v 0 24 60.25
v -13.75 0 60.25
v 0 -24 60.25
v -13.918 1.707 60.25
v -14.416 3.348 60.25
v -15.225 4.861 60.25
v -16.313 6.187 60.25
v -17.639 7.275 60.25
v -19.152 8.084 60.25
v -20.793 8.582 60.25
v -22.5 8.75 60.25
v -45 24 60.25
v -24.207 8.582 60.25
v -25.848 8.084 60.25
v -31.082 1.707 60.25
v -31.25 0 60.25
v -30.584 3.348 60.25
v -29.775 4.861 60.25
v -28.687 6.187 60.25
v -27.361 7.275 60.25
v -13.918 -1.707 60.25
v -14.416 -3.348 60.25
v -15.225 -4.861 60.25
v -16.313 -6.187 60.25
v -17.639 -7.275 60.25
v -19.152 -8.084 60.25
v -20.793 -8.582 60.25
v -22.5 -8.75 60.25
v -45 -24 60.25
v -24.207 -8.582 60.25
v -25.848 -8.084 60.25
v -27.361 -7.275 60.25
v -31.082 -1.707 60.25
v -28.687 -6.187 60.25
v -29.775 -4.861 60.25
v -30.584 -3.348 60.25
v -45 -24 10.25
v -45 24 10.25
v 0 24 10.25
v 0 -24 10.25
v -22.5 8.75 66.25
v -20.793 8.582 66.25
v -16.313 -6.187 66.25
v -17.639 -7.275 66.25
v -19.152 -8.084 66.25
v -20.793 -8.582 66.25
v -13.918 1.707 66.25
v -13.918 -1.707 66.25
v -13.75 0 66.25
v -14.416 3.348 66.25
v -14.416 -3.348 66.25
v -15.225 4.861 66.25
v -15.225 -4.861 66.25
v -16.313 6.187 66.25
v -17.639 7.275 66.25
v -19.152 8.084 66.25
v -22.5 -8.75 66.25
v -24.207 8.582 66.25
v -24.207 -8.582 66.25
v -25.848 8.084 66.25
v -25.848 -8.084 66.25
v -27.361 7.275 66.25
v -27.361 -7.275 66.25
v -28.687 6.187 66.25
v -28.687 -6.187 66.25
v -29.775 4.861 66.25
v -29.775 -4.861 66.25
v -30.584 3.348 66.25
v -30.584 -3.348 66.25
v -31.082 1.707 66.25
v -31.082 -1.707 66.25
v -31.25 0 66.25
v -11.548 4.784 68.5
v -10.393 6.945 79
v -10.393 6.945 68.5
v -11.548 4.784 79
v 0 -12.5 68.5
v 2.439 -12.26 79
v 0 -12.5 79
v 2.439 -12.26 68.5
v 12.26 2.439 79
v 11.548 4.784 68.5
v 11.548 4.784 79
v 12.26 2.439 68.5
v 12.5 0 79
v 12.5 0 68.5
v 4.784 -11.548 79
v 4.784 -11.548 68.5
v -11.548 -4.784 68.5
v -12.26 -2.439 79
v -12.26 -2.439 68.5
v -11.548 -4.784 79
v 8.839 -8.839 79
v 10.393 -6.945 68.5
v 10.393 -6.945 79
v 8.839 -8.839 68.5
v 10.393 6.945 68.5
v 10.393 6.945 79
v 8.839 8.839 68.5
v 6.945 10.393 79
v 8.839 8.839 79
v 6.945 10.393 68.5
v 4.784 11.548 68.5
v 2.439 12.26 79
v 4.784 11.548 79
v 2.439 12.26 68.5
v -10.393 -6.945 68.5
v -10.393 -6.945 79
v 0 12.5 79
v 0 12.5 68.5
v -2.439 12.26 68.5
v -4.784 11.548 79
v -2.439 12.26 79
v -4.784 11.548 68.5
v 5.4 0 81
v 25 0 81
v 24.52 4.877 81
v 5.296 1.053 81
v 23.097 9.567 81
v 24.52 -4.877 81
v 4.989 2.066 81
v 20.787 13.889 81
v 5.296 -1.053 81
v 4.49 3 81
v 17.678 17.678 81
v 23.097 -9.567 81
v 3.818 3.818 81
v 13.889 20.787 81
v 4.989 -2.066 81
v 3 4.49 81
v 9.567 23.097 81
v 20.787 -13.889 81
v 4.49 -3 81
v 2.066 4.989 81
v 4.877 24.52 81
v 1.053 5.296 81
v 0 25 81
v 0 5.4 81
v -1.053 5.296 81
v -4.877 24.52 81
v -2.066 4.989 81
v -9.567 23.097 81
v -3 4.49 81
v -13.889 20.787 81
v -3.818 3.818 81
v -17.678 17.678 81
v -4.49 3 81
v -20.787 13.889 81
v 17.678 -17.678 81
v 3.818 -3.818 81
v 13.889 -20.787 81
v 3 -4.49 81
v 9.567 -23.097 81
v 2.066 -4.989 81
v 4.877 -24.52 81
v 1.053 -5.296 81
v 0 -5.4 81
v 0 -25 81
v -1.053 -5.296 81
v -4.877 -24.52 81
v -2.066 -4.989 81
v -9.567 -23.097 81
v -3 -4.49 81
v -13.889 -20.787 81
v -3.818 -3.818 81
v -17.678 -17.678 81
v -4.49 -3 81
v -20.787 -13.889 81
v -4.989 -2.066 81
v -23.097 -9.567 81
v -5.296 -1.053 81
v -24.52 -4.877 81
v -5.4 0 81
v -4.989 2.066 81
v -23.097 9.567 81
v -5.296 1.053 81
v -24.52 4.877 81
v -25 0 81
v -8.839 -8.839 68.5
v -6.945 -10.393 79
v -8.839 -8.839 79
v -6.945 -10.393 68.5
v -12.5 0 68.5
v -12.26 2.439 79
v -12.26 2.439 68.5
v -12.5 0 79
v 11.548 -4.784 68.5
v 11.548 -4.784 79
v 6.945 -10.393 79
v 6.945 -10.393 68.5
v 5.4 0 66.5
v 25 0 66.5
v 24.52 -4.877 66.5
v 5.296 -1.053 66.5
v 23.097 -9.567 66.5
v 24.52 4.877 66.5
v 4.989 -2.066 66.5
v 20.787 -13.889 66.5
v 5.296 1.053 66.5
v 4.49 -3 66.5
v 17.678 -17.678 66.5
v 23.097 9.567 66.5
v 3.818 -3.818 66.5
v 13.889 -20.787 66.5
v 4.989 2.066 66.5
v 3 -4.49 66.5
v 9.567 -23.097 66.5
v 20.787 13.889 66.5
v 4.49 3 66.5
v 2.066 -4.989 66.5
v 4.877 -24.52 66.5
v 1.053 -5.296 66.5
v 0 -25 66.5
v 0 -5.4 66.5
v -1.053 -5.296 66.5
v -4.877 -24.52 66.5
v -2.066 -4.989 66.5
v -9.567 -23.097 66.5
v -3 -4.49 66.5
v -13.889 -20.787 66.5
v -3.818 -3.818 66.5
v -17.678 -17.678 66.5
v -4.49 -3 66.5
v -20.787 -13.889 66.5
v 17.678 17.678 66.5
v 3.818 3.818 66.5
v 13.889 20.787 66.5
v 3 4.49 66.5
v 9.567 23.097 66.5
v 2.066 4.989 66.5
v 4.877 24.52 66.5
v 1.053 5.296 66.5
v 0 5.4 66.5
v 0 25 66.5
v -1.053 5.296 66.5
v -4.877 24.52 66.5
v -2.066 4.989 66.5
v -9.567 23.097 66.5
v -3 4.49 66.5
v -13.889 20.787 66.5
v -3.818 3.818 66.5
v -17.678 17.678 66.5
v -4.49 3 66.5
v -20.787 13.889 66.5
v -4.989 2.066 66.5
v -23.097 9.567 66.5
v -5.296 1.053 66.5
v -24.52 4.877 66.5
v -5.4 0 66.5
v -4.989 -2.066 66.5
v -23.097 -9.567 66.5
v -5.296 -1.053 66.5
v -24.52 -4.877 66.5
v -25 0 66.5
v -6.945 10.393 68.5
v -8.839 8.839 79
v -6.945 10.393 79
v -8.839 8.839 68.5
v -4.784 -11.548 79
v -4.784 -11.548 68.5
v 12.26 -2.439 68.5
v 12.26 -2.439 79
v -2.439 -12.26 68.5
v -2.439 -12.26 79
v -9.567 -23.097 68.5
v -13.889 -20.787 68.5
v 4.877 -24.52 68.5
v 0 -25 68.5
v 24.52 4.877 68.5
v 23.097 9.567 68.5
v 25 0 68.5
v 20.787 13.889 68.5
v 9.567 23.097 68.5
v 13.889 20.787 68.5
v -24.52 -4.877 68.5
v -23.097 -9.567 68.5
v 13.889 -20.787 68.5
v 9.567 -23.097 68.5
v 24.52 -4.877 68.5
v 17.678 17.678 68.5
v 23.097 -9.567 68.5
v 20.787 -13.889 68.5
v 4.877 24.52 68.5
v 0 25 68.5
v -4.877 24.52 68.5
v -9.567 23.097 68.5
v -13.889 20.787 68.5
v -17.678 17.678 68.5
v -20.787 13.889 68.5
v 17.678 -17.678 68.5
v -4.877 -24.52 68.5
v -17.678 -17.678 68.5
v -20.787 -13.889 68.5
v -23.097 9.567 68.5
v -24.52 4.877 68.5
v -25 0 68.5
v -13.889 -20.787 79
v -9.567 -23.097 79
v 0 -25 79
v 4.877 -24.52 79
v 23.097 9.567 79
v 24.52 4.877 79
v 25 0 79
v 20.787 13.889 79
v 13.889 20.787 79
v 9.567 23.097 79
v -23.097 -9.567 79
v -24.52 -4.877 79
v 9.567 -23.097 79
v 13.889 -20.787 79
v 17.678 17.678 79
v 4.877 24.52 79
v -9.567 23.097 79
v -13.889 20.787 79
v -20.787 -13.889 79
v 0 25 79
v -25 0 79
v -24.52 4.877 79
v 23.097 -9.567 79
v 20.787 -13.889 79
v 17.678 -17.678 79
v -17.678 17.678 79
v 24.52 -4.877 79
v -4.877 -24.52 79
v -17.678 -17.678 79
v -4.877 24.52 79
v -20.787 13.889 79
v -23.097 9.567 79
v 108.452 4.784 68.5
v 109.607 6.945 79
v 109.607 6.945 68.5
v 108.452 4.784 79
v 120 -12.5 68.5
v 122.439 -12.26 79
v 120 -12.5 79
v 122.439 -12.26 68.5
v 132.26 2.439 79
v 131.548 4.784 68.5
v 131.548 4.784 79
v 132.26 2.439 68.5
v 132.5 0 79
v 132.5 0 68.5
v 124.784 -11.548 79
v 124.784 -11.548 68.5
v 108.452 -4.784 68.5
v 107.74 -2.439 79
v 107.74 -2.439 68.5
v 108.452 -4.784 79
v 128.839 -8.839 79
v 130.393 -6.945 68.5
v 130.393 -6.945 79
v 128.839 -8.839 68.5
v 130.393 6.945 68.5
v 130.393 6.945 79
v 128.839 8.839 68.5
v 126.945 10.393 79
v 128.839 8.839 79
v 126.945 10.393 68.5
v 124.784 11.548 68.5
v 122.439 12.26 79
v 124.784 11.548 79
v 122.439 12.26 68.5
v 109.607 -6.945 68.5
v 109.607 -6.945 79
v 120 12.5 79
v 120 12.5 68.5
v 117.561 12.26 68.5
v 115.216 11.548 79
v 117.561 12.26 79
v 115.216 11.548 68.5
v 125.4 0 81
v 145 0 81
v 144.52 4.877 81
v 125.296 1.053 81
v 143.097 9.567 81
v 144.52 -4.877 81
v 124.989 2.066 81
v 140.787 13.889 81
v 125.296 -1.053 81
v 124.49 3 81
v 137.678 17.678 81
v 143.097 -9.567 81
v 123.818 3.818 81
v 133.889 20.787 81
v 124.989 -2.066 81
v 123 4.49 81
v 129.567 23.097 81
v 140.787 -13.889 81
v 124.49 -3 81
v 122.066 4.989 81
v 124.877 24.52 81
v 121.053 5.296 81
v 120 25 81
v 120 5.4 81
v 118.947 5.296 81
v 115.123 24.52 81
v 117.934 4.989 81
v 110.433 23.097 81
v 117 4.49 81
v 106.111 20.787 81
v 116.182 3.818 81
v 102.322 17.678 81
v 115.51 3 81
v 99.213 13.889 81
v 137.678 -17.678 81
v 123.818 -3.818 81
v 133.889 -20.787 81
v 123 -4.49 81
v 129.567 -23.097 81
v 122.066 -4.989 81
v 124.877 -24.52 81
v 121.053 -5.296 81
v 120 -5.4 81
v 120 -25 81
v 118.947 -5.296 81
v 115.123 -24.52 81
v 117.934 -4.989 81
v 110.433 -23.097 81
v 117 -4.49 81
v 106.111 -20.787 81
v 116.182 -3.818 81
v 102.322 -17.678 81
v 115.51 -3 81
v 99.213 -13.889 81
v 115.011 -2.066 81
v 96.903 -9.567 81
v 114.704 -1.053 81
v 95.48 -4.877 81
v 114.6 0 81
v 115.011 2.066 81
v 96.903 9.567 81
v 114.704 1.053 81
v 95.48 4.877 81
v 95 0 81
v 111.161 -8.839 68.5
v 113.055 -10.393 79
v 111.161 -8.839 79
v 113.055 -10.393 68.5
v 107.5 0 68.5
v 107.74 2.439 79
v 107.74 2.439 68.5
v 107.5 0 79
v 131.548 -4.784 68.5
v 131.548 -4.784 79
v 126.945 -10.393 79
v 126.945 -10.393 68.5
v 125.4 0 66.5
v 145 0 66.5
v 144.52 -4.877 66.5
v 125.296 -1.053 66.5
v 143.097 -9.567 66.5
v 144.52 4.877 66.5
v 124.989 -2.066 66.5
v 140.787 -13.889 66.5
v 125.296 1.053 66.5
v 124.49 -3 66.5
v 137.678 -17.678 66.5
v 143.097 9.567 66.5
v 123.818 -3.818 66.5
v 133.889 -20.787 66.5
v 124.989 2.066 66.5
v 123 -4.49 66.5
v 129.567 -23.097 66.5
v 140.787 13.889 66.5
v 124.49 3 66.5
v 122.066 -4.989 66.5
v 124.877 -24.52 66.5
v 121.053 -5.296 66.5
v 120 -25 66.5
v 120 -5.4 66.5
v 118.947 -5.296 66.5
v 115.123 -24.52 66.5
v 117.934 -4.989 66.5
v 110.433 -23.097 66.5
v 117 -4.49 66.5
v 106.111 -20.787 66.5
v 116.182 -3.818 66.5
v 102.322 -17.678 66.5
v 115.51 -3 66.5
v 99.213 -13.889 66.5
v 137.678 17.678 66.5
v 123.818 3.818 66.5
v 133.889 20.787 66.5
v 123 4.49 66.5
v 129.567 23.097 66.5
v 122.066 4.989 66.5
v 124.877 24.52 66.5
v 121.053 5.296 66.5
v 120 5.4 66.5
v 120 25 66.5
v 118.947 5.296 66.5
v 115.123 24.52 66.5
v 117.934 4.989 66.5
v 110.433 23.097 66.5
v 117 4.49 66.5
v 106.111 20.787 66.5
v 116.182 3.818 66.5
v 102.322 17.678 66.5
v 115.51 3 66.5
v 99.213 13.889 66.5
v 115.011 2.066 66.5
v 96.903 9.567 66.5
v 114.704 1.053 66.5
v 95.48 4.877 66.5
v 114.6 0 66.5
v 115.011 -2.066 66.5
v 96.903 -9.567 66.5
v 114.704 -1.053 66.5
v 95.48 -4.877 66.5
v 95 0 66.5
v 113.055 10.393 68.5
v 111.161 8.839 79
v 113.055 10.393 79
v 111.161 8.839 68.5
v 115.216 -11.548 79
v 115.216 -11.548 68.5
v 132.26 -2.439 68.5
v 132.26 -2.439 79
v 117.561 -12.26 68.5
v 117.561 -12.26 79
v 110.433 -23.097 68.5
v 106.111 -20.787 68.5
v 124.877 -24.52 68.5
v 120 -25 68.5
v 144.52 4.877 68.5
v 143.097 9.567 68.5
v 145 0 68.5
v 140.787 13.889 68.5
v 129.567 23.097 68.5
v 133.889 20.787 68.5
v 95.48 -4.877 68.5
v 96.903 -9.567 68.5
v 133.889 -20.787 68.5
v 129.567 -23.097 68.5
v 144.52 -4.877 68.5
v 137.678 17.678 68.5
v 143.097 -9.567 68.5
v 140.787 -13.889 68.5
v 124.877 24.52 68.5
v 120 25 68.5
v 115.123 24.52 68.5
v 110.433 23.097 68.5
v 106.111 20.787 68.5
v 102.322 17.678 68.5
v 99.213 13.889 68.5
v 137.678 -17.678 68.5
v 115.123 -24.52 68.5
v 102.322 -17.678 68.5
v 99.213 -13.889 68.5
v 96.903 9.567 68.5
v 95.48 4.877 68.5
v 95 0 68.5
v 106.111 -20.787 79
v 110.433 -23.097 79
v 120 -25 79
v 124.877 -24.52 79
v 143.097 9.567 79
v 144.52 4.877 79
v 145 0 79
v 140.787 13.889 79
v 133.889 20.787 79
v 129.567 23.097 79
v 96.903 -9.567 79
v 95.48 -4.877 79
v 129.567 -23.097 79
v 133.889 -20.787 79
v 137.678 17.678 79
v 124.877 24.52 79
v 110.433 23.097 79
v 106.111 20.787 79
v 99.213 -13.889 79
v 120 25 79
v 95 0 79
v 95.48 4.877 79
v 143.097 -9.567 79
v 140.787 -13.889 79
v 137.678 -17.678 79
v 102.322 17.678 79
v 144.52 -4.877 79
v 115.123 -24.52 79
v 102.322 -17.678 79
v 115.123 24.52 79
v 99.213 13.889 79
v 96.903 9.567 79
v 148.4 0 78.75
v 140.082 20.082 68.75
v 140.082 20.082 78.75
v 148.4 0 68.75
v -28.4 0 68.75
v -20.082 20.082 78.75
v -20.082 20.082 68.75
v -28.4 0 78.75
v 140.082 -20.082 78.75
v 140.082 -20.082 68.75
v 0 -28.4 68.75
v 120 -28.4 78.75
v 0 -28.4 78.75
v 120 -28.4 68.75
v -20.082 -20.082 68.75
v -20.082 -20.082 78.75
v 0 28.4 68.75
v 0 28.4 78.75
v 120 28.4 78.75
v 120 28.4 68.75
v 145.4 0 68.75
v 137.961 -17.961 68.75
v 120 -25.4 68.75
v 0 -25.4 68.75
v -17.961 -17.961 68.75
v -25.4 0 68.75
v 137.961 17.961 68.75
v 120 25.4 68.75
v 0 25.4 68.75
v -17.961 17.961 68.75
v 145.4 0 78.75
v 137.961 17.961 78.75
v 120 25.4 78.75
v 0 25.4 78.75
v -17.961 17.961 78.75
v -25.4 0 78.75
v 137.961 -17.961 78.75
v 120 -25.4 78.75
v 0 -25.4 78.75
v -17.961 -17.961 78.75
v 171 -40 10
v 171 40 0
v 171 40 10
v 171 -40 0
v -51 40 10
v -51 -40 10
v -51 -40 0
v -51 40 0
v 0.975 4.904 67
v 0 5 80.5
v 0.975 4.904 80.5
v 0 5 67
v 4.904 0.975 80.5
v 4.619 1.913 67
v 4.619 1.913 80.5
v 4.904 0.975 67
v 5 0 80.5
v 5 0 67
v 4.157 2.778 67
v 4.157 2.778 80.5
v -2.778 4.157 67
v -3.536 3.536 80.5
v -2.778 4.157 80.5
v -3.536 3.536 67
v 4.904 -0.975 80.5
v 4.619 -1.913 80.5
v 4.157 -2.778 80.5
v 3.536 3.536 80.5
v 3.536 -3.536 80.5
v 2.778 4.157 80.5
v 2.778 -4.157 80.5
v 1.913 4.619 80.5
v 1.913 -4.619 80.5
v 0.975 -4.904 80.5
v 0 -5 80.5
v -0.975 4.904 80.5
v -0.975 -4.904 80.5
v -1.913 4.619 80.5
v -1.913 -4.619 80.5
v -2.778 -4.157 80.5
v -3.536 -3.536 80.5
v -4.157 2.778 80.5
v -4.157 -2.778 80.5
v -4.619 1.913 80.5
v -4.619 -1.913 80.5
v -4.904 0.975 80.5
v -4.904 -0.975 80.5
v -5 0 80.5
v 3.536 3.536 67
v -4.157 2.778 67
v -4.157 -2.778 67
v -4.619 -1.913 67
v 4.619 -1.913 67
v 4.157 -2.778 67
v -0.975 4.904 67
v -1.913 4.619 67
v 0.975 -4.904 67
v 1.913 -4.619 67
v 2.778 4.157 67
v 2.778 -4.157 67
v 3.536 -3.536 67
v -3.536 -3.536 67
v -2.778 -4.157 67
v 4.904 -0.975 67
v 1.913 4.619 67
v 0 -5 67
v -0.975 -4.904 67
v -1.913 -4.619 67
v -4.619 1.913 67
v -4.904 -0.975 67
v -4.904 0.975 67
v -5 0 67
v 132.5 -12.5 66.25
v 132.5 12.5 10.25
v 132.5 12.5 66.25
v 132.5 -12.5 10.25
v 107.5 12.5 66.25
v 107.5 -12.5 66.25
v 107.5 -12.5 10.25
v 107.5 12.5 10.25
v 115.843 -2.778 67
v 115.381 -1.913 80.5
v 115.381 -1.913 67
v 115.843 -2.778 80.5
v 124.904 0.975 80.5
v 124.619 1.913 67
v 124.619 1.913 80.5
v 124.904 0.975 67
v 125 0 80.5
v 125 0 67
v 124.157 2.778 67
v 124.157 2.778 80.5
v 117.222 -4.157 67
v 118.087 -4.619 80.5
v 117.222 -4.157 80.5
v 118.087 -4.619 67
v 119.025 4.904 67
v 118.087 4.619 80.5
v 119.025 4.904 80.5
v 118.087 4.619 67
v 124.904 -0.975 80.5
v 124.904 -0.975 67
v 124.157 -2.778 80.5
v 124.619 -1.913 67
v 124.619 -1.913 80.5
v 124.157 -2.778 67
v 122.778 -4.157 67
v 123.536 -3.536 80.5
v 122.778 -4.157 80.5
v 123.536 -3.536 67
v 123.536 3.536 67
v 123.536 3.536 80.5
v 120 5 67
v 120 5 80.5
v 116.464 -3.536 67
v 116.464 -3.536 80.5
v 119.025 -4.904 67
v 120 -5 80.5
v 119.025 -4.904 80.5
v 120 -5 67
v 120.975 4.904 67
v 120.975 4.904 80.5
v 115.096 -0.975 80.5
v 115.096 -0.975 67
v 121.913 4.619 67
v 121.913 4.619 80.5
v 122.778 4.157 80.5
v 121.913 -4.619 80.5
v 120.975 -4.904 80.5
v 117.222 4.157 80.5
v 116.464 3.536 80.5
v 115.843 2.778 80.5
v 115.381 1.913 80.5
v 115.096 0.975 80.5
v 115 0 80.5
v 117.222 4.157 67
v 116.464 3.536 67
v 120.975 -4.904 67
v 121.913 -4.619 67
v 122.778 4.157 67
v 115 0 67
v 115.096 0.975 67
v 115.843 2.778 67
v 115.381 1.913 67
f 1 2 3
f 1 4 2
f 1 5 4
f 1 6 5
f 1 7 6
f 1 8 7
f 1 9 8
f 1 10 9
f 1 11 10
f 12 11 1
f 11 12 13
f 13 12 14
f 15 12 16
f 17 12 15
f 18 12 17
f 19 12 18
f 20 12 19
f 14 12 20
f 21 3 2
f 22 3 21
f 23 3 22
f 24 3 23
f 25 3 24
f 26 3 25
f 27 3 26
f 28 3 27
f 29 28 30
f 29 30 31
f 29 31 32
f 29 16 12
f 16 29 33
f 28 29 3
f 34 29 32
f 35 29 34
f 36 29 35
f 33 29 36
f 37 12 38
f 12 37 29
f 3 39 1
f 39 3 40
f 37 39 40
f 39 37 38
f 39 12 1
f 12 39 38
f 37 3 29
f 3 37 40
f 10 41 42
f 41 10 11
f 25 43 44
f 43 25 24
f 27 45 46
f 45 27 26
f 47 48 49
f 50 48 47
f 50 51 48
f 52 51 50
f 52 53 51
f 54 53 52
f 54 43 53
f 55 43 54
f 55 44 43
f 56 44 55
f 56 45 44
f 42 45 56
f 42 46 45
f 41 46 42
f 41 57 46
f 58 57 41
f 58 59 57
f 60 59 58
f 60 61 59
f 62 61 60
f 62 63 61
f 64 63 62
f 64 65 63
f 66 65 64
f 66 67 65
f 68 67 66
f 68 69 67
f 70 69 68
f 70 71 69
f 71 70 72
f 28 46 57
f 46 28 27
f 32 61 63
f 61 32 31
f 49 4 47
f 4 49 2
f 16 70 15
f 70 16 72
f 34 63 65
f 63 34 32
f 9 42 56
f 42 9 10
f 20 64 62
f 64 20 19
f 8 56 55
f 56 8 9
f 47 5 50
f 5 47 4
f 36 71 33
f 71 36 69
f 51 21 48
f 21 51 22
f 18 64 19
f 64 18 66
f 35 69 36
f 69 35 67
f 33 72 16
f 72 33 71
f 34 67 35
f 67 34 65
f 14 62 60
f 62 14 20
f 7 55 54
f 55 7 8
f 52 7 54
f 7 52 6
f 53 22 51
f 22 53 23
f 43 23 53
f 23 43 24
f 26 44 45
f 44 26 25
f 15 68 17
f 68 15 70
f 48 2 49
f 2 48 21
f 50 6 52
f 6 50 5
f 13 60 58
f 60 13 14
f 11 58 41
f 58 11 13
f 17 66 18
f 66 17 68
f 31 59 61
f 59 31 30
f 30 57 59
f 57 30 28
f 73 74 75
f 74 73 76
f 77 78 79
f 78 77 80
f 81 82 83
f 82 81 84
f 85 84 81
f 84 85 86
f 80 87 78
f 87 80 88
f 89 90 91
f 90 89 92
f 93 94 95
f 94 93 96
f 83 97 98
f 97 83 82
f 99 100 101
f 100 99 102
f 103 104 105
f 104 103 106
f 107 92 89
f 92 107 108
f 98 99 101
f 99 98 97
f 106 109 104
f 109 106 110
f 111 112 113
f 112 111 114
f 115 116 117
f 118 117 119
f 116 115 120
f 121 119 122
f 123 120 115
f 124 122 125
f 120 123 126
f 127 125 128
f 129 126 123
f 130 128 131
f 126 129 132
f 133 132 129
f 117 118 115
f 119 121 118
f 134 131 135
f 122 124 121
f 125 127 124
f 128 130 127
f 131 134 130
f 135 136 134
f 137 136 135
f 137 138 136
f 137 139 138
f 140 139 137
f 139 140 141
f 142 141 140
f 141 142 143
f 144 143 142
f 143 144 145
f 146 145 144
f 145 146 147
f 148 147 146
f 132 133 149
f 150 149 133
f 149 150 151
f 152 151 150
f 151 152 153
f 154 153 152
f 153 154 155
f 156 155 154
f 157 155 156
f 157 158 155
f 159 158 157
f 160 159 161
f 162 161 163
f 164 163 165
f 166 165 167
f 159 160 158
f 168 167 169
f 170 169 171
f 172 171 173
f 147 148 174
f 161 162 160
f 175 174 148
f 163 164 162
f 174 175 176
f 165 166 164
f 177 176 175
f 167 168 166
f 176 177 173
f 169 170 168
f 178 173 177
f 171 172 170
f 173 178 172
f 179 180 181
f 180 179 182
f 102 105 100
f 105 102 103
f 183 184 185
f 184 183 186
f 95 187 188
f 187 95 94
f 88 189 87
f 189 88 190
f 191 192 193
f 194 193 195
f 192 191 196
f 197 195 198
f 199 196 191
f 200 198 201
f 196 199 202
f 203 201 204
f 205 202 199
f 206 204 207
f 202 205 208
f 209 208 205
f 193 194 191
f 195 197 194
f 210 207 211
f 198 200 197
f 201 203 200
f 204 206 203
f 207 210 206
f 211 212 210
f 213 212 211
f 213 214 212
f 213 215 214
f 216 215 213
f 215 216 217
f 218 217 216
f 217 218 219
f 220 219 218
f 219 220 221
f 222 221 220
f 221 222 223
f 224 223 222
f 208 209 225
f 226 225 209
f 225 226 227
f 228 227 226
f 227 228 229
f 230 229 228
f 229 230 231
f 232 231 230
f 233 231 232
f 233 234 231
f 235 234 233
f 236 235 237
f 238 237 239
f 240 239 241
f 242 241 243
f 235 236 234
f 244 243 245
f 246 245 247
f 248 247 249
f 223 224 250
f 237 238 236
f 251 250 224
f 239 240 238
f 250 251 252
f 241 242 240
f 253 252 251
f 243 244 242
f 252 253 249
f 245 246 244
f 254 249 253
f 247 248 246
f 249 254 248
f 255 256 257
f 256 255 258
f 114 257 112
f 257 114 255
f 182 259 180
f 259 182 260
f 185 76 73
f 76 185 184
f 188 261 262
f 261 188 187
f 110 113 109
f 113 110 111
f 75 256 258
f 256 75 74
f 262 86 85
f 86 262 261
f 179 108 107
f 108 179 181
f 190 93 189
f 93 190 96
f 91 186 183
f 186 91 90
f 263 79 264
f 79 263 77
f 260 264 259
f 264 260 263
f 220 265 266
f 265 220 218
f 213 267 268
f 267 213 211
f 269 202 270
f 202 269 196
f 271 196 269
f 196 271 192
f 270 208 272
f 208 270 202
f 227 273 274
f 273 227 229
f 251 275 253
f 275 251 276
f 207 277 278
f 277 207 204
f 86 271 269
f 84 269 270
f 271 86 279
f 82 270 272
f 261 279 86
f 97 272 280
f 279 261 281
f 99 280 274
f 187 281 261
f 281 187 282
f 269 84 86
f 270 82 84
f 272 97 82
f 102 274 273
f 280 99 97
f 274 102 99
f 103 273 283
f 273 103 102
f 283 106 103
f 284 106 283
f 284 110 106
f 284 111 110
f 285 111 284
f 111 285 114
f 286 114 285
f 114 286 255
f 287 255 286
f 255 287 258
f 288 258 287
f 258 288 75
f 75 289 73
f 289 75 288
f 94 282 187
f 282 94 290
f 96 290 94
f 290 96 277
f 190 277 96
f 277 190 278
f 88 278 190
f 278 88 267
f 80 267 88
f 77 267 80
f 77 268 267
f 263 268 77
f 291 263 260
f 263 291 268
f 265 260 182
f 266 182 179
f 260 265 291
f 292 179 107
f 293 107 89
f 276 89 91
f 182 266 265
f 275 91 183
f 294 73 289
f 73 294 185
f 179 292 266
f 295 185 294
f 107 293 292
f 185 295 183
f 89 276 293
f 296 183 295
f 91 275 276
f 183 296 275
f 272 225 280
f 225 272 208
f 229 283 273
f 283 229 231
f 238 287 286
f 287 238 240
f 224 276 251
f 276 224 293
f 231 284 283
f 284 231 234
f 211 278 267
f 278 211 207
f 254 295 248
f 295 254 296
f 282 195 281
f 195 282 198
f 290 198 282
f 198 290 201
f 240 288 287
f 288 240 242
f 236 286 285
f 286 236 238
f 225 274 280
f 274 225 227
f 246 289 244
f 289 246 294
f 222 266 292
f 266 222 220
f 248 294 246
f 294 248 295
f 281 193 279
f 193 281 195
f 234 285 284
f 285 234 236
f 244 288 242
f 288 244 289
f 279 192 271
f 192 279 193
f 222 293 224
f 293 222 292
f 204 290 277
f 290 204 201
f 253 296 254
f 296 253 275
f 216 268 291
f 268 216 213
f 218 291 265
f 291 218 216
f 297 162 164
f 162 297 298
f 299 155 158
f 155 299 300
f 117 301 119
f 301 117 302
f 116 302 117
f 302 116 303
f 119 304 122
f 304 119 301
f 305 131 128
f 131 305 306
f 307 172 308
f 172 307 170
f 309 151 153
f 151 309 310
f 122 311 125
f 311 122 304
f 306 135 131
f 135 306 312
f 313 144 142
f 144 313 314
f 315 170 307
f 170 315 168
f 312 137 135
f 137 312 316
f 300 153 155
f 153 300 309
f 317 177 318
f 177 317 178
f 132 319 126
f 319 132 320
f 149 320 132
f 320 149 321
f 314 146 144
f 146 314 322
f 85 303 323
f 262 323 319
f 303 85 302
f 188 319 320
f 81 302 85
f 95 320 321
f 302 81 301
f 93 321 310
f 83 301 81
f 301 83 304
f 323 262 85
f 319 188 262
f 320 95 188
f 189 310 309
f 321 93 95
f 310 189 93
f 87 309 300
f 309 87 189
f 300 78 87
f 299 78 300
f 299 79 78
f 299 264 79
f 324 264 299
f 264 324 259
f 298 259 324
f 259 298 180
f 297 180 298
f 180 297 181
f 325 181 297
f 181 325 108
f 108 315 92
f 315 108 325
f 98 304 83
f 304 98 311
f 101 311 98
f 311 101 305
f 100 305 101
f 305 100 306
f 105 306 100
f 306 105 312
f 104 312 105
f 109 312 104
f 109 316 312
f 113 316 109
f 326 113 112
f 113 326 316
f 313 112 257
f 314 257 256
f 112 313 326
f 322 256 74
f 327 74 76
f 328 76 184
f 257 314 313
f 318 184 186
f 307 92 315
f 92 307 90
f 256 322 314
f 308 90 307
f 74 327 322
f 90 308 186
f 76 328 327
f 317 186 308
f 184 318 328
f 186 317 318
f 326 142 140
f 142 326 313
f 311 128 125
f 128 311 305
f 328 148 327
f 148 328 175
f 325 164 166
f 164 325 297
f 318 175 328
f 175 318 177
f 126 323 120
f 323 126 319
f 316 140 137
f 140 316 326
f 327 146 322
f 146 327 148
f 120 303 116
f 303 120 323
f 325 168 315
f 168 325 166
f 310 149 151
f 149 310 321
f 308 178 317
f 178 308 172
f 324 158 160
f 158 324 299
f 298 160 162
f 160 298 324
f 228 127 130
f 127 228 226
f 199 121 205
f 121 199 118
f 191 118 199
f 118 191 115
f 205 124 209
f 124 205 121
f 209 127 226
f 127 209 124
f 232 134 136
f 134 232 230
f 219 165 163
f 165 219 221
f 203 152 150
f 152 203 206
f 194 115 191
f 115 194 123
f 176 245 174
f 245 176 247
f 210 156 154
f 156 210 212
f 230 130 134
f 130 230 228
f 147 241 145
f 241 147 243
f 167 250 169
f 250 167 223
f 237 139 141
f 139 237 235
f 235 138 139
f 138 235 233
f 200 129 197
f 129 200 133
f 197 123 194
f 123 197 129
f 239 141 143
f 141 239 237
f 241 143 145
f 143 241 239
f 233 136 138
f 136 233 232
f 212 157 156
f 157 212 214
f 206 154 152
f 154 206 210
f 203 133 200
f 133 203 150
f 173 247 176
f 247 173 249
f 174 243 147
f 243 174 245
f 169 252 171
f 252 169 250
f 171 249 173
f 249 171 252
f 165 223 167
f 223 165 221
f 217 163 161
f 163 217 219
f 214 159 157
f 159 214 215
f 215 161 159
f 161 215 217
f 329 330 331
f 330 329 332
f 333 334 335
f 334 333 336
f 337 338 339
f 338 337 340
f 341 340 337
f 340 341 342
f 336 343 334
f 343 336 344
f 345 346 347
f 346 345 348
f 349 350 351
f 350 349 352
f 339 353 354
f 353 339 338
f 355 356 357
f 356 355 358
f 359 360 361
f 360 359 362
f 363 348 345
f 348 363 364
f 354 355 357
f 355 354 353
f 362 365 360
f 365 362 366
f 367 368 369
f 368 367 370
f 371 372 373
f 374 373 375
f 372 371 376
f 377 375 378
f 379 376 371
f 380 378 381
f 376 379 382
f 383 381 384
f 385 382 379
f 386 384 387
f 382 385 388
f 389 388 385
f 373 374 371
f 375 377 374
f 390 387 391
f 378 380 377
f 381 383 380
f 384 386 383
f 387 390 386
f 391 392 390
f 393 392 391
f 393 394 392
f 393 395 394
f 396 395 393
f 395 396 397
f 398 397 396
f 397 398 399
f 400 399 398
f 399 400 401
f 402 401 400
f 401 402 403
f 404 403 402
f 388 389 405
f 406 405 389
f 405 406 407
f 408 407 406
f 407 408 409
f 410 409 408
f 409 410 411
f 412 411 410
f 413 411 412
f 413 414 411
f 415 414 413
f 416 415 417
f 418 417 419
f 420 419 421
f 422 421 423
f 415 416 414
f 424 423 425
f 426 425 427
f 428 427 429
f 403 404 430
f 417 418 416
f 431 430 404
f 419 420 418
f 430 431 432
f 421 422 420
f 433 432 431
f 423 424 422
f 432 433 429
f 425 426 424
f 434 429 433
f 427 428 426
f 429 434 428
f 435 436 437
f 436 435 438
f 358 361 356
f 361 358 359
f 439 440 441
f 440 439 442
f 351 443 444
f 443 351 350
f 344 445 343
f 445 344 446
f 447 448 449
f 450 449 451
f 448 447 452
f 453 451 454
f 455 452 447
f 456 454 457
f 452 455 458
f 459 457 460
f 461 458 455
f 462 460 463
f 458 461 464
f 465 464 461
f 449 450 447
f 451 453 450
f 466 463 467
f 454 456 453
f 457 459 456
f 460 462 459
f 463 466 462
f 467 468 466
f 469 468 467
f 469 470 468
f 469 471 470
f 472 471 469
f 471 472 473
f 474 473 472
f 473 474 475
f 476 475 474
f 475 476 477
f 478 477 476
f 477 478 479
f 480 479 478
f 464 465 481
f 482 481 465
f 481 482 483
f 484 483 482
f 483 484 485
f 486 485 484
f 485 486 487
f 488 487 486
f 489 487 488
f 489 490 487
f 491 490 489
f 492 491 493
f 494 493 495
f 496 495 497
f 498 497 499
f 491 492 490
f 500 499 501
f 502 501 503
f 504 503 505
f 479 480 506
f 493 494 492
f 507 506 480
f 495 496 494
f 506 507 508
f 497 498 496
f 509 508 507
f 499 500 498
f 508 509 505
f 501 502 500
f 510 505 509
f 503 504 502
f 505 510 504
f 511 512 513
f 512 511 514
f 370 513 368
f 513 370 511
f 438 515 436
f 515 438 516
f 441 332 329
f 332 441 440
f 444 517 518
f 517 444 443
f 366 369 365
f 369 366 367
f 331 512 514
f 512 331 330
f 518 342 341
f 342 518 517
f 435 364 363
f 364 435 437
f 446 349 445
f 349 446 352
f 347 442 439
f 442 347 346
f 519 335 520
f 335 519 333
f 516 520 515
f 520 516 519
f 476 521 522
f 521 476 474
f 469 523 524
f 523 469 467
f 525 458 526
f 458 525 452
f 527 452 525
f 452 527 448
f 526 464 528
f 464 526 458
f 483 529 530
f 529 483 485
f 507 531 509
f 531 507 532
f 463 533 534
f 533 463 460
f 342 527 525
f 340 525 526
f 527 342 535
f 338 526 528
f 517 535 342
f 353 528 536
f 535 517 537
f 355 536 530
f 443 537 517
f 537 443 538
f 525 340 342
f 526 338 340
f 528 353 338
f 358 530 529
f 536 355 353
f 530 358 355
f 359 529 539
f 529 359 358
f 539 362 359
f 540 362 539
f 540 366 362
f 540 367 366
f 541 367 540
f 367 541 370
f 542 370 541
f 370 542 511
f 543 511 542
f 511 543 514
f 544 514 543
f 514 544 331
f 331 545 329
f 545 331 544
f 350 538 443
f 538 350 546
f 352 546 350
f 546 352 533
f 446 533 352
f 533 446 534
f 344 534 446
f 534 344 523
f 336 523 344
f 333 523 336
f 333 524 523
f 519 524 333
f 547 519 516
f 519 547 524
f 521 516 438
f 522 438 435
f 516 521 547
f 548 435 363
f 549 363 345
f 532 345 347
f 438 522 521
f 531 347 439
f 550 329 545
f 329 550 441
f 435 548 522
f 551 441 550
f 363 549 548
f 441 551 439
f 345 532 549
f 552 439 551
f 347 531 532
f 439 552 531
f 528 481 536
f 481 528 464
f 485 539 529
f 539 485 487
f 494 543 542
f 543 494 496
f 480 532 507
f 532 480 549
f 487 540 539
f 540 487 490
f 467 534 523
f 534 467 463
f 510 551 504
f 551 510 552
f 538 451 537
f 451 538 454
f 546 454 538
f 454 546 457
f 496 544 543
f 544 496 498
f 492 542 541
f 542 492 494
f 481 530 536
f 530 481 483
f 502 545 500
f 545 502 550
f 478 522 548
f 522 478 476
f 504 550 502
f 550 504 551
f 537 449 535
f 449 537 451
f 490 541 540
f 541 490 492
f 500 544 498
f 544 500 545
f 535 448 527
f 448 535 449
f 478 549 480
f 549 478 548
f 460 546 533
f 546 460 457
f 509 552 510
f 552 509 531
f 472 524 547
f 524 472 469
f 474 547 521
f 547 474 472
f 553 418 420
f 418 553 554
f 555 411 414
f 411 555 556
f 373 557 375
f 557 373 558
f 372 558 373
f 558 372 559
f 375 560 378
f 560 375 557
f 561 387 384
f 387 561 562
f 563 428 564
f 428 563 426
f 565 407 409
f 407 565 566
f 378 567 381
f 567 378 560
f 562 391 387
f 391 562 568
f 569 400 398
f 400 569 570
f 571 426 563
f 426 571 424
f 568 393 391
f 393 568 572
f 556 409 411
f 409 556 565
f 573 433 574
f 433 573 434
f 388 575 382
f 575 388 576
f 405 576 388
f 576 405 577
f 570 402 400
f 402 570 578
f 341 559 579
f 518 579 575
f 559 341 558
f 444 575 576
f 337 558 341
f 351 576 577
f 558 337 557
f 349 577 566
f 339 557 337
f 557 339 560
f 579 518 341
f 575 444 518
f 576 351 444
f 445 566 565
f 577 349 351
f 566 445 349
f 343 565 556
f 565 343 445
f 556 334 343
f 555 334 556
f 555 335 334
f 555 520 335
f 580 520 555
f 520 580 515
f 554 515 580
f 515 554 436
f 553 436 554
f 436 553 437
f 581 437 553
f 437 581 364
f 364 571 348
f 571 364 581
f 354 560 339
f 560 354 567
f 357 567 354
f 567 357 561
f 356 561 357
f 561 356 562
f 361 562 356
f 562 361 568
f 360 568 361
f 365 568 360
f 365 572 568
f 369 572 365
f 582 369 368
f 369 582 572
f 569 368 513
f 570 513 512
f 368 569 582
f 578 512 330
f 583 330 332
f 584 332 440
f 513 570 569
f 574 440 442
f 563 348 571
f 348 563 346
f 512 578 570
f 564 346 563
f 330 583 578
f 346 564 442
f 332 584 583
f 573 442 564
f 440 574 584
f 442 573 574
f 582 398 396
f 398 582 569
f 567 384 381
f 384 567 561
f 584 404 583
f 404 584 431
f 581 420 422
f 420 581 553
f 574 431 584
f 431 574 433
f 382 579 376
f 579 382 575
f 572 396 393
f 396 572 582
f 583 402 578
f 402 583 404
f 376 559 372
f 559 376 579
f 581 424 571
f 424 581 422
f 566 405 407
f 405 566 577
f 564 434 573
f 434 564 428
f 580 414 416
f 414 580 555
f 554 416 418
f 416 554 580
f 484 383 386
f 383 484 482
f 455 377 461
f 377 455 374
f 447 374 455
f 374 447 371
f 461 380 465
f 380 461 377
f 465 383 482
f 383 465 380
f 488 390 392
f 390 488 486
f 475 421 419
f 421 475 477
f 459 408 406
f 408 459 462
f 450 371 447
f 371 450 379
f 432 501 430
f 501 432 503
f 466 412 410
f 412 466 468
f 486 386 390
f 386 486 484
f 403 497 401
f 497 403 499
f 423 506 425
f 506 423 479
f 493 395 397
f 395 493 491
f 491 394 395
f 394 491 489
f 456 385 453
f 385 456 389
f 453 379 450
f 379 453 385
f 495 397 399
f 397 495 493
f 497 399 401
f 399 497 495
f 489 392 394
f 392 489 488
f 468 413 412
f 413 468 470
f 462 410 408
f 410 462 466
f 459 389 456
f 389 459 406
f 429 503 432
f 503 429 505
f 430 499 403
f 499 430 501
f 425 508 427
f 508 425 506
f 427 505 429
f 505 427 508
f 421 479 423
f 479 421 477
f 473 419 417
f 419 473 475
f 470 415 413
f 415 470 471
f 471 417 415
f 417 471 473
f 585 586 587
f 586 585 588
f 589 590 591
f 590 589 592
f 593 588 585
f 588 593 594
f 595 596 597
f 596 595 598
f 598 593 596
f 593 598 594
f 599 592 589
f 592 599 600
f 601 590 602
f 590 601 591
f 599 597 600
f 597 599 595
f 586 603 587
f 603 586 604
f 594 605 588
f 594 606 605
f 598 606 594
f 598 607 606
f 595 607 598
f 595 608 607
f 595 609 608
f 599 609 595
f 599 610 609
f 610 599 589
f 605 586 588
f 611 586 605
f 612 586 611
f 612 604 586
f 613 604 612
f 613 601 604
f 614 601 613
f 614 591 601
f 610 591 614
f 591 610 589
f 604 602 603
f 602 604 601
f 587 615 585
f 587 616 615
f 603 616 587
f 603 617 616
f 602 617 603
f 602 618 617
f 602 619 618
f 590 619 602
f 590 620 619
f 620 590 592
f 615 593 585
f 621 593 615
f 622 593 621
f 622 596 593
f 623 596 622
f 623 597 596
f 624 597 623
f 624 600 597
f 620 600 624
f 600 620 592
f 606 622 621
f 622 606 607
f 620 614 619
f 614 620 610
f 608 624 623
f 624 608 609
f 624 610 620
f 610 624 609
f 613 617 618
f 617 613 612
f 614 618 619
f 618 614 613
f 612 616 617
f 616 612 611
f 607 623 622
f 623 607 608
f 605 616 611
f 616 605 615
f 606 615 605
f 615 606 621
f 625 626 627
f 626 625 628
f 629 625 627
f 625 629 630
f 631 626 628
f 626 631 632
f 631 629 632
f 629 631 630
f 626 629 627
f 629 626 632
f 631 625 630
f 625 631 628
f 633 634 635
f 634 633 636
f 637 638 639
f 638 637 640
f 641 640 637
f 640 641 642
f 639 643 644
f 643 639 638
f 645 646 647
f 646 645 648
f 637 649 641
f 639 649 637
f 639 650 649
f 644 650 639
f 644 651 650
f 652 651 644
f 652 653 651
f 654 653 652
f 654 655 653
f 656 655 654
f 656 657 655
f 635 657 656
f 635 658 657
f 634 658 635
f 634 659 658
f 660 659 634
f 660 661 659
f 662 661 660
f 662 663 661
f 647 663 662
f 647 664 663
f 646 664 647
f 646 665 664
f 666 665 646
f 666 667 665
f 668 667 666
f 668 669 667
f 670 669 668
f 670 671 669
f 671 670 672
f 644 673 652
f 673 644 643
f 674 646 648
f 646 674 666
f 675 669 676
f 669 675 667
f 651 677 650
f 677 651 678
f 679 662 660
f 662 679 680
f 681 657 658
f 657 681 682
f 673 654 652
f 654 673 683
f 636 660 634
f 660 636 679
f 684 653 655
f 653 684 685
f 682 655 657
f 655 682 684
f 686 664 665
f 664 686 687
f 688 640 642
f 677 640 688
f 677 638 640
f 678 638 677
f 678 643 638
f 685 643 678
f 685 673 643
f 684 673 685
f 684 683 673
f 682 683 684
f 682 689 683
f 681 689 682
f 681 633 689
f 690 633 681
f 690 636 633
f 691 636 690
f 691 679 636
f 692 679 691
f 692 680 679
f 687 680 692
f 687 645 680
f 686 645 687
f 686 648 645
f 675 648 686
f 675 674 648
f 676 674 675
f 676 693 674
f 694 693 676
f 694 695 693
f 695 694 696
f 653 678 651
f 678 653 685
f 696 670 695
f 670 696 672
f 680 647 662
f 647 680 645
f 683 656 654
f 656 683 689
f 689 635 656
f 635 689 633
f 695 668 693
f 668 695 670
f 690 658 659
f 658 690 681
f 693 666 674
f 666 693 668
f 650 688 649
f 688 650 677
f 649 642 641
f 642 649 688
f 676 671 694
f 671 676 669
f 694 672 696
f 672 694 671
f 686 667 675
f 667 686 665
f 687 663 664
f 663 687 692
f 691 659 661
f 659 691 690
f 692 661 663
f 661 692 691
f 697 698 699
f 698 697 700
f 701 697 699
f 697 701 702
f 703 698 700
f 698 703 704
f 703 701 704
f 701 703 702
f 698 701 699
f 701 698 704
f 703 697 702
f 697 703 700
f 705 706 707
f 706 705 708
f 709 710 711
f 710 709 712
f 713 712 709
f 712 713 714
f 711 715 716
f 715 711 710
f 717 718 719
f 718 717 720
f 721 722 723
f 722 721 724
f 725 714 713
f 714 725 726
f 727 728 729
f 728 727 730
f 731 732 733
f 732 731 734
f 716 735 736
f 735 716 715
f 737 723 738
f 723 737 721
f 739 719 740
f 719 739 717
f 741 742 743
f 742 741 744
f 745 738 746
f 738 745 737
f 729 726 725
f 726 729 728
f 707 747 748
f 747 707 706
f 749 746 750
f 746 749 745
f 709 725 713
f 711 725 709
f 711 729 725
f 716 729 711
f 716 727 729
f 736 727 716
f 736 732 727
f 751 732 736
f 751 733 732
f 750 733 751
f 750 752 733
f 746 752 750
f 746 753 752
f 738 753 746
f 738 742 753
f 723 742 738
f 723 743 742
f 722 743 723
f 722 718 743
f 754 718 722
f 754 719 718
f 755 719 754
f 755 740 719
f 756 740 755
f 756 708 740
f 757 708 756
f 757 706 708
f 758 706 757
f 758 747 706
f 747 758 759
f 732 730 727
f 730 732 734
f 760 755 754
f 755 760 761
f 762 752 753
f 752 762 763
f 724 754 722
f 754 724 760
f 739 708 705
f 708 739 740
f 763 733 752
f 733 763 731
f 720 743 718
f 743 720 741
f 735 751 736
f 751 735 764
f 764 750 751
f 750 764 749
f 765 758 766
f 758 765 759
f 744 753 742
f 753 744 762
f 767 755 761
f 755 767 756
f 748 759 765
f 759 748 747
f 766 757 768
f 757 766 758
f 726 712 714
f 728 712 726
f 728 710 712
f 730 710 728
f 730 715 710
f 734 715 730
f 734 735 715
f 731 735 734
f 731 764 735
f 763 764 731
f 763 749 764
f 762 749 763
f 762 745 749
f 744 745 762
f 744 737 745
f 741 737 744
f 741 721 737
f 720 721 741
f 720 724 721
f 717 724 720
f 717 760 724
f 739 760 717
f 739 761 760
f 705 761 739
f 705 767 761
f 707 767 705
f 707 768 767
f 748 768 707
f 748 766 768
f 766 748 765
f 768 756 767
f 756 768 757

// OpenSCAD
$fn = 32;

// ------------------------------------------------------------------------
// Motor belt drive: span 120 mm, pulleys d50, belt 10 mm wide
// Every part is its own module, assembly() places every instance.
// ------------------------------------------------------------------------

// --- part 1 ---
module base_plate() {
  difference() {
    translate([-111, -40, 0]) cube([222, 80, 10]);
  }
}

// --- part 2 ---
module motor() {
  union() {
    translate([-25, -24, 0]) cube([50, 48, 45]);
    translate([28, 0, 22.5]) rotate([0, 90, 0]) cylinder(h = 6, d = 17.5, center = true);
  }
}

// --- part 3 ---
module drive_shaft() {
  translate([0, 0, -6.75]) cylinder(h = 13.5, d = 10);
}

// --- part 4 ---
module pulley_drive() {
  difference() {
    union() {
      cylinder(h = 14.5, d = 25);
      cylinder(h = 2, d = 50);
      translate([0, 0, 12.5]) cylinder(h = 2, d = 50);
    }
    translate([0, 0, -1]) cylinder(h = 16.5, d = 10.8);
  }
}

// --- part 5 ---
module idler_post() {
  translate([-12.5, -12.5, 0]) cube([25, 25, 56]);
}

// --- part 6 ---
module driven_shaft() {
  translate([0, 0, -6.75]) cylinder(h = 13.5, d = 10);
}

// --- part 7 ---
module pulley_driven() {
  difference() {
    union() {
      cylinder(h = 14.5, d = 25);
      cylinder(h = 2, d = 50);
      translate([0, 0, 12.5]) cylinder(h = 2, d = 50);
    }
    translate([0, 0, -1]) cylinder(h = 16.5, d = 10.8);
  }
}

// --- part 8 ---
module drive_belt() {
  difference() {
    linear_extrude(height = 10) polygon(points = concat([for (a = [90 : 45 : 270]) [28.4 * cos(a), 28.4 * sin(a)]], [for (a = [270 : 45 : 450]) [120 + 28.4 * cos(a), 28.4 * sin(a)]]));
    translate([0, 0, -1]) linear_extrude(height = 12) polygon(points = concat([for (a = [90 : 45 : 270]) [25.4 * cos(a), 25.4 * sin(a)]], [for (a = [270 : 45 : 450]) [120 + 25.4 * cos(a), 25.4 * sin(a)]]));
  }
}

// --- assembly ---
module assembly() {
  color([0.80, 0.24, 0.20]) translate([60, 0, 0]) rotate([0, 0, 0]) base_plate();
  color([0.20, 0.45, 0.75]) translate([0, 0, 35.25]) rotate([0, 270, 0]) motor();
  color([0.25, 0.62, 0.32]) translate([0, 0, 73.75]) rotate([0, 0, 0]) drive_shaft();
  color([0.92, 0.70, 0.18]) translate([0, 0, 66.5]) rotate([0, 0, 0]) pulley_drive();
  color([0.58, 0.35, 0.70]) translate([120, 0, 10.25]) rotate([0, 0, 0]) idler_post();
  color([0.16, 0.66, 0.66]) translate([120, 0, 73.75]) rotate([0, 0, 0]) driven_shaft();
  color([0.85, 0.48, 0.18]) translate([120, 0, 66.5]) rotate([0, 0, 0]) pulley_driven();
  color([0.55, 0.60, 0.65]) translate([0, 0, 68.75]) rotate([0, 0, 0]) drive_belt();
}

assembly();
